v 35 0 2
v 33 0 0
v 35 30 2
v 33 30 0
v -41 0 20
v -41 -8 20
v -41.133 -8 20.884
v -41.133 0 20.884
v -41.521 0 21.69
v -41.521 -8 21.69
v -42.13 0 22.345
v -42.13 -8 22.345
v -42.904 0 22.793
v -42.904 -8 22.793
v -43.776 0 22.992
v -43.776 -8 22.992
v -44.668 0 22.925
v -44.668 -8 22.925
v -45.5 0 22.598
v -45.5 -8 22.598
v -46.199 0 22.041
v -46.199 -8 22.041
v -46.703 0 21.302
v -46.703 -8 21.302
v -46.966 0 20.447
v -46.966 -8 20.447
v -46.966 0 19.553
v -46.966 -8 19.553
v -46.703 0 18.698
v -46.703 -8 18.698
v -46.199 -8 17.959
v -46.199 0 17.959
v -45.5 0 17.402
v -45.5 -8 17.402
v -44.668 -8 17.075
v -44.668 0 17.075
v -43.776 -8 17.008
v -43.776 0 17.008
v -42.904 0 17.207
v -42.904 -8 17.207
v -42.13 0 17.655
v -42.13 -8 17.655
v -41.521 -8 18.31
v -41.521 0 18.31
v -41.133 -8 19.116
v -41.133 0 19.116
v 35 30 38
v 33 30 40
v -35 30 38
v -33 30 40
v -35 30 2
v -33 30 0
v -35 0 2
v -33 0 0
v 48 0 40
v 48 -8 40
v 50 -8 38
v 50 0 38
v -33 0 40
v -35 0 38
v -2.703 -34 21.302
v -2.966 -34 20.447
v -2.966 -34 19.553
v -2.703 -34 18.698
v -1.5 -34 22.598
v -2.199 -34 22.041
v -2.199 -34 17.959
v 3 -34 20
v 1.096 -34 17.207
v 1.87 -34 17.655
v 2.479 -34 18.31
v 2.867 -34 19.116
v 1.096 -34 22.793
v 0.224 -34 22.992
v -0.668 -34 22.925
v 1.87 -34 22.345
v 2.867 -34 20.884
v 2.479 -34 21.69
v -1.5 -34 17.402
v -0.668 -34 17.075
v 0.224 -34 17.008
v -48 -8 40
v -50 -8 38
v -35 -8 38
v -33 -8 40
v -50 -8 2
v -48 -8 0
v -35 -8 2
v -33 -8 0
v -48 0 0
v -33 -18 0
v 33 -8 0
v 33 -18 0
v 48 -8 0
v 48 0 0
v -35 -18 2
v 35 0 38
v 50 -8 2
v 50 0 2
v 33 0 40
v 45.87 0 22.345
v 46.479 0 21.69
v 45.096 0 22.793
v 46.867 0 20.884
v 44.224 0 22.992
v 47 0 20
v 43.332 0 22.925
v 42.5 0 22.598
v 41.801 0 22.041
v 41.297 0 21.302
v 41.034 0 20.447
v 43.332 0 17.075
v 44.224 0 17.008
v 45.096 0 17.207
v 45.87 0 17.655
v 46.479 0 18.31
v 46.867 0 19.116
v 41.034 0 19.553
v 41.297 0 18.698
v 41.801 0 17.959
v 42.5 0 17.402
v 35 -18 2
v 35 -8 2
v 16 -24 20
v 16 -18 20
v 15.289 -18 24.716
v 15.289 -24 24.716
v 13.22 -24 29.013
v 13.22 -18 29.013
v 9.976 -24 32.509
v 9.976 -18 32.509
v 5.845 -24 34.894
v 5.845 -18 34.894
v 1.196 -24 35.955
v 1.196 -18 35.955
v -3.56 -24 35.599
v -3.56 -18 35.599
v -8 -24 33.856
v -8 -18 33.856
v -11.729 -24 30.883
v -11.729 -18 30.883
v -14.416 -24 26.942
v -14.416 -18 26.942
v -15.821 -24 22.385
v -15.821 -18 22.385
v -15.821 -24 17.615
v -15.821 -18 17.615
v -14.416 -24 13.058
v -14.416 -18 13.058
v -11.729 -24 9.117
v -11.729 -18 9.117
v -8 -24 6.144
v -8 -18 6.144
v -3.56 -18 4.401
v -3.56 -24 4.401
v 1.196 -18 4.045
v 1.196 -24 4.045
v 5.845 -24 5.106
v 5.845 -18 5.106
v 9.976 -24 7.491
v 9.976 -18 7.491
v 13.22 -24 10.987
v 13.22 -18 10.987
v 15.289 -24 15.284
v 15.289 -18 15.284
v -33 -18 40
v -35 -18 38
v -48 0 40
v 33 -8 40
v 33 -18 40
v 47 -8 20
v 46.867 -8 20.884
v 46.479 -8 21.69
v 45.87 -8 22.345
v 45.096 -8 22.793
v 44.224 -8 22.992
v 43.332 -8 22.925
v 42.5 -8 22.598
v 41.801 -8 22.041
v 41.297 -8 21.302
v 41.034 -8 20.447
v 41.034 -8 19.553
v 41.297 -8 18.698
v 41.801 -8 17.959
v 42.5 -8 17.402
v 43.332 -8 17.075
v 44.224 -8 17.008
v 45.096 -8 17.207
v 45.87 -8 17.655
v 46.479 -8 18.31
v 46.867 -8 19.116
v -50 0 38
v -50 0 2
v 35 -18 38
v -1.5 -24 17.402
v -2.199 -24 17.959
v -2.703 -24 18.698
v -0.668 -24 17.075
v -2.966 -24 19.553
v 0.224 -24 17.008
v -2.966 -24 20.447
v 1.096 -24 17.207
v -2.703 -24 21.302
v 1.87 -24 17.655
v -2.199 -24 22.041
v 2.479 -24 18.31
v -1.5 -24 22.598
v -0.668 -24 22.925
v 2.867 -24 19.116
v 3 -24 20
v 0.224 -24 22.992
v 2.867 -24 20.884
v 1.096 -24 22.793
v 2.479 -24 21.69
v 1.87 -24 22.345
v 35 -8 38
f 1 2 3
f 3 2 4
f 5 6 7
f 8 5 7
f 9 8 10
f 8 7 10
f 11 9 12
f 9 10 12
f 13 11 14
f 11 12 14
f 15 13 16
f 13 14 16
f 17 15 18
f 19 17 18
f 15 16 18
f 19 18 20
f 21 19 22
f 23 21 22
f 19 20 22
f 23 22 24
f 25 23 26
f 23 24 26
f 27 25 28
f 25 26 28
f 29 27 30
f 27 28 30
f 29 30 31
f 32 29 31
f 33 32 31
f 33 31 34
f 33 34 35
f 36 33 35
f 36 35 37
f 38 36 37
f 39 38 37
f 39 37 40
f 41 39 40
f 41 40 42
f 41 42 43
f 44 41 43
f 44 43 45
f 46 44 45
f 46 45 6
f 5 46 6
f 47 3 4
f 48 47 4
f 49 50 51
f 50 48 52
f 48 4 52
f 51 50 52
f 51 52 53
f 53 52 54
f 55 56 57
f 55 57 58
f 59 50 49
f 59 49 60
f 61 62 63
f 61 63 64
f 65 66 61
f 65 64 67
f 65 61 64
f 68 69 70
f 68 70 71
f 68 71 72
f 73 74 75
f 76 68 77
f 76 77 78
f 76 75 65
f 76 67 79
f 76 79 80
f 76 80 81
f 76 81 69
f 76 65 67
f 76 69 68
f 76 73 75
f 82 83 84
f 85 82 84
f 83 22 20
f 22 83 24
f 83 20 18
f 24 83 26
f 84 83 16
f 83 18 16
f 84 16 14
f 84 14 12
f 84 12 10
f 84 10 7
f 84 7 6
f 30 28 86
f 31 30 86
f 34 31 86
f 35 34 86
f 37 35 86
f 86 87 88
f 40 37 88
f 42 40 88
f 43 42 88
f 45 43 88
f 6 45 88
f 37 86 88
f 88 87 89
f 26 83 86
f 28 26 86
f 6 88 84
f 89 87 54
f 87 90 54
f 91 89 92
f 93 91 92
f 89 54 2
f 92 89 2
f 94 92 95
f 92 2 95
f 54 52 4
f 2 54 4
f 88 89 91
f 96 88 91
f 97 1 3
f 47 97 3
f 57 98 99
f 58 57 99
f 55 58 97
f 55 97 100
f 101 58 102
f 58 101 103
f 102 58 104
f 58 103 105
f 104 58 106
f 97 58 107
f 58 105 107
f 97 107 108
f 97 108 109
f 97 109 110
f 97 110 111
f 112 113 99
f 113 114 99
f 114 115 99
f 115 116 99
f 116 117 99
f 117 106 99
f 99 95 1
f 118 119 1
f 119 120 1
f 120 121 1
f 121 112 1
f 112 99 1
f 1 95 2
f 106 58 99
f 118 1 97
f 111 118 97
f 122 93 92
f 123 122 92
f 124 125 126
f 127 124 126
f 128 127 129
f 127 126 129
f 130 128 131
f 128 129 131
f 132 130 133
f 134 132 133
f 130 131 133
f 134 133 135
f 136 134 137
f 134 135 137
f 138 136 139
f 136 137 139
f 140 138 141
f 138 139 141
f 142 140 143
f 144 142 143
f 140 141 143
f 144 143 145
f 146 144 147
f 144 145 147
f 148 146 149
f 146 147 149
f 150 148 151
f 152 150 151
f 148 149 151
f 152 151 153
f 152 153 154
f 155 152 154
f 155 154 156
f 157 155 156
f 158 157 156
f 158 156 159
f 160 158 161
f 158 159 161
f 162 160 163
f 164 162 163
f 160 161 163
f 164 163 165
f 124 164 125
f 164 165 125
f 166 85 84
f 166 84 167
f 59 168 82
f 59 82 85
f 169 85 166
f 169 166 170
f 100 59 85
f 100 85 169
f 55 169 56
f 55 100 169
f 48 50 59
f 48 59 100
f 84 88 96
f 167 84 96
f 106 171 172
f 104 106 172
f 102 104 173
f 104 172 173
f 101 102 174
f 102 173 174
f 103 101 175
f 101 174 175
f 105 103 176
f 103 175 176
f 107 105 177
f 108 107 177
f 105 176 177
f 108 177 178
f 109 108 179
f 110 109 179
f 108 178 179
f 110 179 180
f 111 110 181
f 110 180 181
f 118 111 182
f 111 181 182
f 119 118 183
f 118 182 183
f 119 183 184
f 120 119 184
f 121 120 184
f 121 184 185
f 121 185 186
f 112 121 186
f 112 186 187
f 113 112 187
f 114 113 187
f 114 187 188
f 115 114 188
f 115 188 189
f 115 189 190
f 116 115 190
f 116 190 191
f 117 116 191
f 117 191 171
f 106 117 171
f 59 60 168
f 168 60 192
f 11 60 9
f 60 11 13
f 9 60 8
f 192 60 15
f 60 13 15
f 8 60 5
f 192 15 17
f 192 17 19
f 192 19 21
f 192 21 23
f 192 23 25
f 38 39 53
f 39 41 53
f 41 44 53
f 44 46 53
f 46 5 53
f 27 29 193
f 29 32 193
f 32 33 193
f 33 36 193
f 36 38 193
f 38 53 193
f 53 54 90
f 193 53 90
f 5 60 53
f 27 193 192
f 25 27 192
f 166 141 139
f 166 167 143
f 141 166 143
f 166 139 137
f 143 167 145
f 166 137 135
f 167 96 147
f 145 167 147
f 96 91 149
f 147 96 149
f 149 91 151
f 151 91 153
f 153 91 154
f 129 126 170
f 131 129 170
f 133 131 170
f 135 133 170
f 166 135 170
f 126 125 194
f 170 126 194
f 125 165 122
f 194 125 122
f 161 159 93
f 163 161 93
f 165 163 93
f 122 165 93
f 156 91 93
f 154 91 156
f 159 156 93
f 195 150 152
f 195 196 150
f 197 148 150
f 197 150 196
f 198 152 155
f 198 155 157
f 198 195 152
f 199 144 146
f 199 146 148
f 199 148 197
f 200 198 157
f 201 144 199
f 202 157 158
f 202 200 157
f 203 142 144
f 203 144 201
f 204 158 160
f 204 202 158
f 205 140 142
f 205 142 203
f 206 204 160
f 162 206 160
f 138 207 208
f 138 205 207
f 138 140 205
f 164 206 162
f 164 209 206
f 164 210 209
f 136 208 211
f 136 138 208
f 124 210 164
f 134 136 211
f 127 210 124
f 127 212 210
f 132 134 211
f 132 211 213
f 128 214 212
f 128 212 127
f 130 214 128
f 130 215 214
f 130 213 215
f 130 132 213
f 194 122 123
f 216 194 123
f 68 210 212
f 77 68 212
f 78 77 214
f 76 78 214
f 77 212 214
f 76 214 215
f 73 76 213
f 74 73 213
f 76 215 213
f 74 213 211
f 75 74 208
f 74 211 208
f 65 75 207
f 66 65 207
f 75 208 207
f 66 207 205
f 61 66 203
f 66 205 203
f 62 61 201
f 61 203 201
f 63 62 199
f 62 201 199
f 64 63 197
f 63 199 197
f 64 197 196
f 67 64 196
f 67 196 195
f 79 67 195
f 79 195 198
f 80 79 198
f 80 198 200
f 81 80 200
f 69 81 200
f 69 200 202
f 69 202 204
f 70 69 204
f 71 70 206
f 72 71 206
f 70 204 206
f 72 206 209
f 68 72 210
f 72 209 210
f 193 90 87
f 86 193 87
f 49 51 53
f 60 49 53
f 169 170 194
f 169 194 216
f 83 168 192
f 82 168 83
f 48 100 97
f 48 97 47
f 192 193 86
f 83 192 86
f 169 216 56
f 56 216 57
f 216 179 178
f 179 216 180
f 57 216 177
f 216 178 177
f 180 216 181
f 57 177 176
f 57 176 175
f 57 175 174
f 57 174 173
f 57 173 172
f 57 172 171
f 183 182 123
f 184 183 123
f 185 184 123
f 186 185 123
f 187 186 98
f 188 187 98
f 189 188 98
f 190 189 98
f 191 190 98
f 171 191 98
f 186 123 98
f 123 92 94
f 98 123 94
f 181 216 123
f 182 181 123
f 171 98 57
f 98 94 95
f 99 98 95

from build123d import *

# Parameters (mm, degrees)
F1_DEPTH = 40
F2_SIZE  = 2
F3_R     = 16
F4_DEPTH = 6
F5_R     = 3
F6_DEPTH = 10
F7_R     = 3
F8_DEPTH = 25


with BuildPart() as f1:
    # F0 (on Top) → F1 (new body)
    with BuildSketch(Plane.XY):
        Polygon((-50, 0), (-50, -8), (-35, -8), (-35, -18), (0, -18), (35, -18), (35, -8), (50, -8), (50, 0), (35, 0), (35, 30), (0, 30), (-35, 30), (-35, 0), align=None)
    extrude(amount=F1_DEPTH)

    # F2
    f2_edges = [f1.edges().sort_by_distance(p)[0] for p in [
        (35, 15, 40),
        (35, -13, 40),
        (50, -4, 40),
        (35, -13, 0),
        (50, -4, 0),
        (35, 15, 0),
        (-35, 15, 40),
        (-35, -13, 40),
        (-50, -4, 40),
        (-35, 15, 0),
        (-50, -4, 0),
        (-35, -13, 0),
    ]]
    chamfer(f2_edges, length=F2_SIZE)

    # F3 (on face) → F4 (join)
    with BuildSketch(Plane.XZ.offset(18)):
        with Locations((0, 20)):
            Circle(F3_R)
    extrude(amount=F4_DEPTH)

    # F5 (on face) → F6 (join)
    with BuildSketch(Plane.XZ.offset(24)):
        with Locations((0, 20)):
            Circle(F5_R)
    extrude(amount=F6_DEPTH)

    # F7 (on face) → F8 (cut)
    with BuildSketch(Plane.XZ.offset(8)):
        with Locations((-44, 20)):
            Circle(F7_R)
        with Locations((44, 20)):
            Circle(F7_R)
    extrude(amount=-F8_DEPTH, mode=Mode.SUBTRACT)


solid = f1.part
